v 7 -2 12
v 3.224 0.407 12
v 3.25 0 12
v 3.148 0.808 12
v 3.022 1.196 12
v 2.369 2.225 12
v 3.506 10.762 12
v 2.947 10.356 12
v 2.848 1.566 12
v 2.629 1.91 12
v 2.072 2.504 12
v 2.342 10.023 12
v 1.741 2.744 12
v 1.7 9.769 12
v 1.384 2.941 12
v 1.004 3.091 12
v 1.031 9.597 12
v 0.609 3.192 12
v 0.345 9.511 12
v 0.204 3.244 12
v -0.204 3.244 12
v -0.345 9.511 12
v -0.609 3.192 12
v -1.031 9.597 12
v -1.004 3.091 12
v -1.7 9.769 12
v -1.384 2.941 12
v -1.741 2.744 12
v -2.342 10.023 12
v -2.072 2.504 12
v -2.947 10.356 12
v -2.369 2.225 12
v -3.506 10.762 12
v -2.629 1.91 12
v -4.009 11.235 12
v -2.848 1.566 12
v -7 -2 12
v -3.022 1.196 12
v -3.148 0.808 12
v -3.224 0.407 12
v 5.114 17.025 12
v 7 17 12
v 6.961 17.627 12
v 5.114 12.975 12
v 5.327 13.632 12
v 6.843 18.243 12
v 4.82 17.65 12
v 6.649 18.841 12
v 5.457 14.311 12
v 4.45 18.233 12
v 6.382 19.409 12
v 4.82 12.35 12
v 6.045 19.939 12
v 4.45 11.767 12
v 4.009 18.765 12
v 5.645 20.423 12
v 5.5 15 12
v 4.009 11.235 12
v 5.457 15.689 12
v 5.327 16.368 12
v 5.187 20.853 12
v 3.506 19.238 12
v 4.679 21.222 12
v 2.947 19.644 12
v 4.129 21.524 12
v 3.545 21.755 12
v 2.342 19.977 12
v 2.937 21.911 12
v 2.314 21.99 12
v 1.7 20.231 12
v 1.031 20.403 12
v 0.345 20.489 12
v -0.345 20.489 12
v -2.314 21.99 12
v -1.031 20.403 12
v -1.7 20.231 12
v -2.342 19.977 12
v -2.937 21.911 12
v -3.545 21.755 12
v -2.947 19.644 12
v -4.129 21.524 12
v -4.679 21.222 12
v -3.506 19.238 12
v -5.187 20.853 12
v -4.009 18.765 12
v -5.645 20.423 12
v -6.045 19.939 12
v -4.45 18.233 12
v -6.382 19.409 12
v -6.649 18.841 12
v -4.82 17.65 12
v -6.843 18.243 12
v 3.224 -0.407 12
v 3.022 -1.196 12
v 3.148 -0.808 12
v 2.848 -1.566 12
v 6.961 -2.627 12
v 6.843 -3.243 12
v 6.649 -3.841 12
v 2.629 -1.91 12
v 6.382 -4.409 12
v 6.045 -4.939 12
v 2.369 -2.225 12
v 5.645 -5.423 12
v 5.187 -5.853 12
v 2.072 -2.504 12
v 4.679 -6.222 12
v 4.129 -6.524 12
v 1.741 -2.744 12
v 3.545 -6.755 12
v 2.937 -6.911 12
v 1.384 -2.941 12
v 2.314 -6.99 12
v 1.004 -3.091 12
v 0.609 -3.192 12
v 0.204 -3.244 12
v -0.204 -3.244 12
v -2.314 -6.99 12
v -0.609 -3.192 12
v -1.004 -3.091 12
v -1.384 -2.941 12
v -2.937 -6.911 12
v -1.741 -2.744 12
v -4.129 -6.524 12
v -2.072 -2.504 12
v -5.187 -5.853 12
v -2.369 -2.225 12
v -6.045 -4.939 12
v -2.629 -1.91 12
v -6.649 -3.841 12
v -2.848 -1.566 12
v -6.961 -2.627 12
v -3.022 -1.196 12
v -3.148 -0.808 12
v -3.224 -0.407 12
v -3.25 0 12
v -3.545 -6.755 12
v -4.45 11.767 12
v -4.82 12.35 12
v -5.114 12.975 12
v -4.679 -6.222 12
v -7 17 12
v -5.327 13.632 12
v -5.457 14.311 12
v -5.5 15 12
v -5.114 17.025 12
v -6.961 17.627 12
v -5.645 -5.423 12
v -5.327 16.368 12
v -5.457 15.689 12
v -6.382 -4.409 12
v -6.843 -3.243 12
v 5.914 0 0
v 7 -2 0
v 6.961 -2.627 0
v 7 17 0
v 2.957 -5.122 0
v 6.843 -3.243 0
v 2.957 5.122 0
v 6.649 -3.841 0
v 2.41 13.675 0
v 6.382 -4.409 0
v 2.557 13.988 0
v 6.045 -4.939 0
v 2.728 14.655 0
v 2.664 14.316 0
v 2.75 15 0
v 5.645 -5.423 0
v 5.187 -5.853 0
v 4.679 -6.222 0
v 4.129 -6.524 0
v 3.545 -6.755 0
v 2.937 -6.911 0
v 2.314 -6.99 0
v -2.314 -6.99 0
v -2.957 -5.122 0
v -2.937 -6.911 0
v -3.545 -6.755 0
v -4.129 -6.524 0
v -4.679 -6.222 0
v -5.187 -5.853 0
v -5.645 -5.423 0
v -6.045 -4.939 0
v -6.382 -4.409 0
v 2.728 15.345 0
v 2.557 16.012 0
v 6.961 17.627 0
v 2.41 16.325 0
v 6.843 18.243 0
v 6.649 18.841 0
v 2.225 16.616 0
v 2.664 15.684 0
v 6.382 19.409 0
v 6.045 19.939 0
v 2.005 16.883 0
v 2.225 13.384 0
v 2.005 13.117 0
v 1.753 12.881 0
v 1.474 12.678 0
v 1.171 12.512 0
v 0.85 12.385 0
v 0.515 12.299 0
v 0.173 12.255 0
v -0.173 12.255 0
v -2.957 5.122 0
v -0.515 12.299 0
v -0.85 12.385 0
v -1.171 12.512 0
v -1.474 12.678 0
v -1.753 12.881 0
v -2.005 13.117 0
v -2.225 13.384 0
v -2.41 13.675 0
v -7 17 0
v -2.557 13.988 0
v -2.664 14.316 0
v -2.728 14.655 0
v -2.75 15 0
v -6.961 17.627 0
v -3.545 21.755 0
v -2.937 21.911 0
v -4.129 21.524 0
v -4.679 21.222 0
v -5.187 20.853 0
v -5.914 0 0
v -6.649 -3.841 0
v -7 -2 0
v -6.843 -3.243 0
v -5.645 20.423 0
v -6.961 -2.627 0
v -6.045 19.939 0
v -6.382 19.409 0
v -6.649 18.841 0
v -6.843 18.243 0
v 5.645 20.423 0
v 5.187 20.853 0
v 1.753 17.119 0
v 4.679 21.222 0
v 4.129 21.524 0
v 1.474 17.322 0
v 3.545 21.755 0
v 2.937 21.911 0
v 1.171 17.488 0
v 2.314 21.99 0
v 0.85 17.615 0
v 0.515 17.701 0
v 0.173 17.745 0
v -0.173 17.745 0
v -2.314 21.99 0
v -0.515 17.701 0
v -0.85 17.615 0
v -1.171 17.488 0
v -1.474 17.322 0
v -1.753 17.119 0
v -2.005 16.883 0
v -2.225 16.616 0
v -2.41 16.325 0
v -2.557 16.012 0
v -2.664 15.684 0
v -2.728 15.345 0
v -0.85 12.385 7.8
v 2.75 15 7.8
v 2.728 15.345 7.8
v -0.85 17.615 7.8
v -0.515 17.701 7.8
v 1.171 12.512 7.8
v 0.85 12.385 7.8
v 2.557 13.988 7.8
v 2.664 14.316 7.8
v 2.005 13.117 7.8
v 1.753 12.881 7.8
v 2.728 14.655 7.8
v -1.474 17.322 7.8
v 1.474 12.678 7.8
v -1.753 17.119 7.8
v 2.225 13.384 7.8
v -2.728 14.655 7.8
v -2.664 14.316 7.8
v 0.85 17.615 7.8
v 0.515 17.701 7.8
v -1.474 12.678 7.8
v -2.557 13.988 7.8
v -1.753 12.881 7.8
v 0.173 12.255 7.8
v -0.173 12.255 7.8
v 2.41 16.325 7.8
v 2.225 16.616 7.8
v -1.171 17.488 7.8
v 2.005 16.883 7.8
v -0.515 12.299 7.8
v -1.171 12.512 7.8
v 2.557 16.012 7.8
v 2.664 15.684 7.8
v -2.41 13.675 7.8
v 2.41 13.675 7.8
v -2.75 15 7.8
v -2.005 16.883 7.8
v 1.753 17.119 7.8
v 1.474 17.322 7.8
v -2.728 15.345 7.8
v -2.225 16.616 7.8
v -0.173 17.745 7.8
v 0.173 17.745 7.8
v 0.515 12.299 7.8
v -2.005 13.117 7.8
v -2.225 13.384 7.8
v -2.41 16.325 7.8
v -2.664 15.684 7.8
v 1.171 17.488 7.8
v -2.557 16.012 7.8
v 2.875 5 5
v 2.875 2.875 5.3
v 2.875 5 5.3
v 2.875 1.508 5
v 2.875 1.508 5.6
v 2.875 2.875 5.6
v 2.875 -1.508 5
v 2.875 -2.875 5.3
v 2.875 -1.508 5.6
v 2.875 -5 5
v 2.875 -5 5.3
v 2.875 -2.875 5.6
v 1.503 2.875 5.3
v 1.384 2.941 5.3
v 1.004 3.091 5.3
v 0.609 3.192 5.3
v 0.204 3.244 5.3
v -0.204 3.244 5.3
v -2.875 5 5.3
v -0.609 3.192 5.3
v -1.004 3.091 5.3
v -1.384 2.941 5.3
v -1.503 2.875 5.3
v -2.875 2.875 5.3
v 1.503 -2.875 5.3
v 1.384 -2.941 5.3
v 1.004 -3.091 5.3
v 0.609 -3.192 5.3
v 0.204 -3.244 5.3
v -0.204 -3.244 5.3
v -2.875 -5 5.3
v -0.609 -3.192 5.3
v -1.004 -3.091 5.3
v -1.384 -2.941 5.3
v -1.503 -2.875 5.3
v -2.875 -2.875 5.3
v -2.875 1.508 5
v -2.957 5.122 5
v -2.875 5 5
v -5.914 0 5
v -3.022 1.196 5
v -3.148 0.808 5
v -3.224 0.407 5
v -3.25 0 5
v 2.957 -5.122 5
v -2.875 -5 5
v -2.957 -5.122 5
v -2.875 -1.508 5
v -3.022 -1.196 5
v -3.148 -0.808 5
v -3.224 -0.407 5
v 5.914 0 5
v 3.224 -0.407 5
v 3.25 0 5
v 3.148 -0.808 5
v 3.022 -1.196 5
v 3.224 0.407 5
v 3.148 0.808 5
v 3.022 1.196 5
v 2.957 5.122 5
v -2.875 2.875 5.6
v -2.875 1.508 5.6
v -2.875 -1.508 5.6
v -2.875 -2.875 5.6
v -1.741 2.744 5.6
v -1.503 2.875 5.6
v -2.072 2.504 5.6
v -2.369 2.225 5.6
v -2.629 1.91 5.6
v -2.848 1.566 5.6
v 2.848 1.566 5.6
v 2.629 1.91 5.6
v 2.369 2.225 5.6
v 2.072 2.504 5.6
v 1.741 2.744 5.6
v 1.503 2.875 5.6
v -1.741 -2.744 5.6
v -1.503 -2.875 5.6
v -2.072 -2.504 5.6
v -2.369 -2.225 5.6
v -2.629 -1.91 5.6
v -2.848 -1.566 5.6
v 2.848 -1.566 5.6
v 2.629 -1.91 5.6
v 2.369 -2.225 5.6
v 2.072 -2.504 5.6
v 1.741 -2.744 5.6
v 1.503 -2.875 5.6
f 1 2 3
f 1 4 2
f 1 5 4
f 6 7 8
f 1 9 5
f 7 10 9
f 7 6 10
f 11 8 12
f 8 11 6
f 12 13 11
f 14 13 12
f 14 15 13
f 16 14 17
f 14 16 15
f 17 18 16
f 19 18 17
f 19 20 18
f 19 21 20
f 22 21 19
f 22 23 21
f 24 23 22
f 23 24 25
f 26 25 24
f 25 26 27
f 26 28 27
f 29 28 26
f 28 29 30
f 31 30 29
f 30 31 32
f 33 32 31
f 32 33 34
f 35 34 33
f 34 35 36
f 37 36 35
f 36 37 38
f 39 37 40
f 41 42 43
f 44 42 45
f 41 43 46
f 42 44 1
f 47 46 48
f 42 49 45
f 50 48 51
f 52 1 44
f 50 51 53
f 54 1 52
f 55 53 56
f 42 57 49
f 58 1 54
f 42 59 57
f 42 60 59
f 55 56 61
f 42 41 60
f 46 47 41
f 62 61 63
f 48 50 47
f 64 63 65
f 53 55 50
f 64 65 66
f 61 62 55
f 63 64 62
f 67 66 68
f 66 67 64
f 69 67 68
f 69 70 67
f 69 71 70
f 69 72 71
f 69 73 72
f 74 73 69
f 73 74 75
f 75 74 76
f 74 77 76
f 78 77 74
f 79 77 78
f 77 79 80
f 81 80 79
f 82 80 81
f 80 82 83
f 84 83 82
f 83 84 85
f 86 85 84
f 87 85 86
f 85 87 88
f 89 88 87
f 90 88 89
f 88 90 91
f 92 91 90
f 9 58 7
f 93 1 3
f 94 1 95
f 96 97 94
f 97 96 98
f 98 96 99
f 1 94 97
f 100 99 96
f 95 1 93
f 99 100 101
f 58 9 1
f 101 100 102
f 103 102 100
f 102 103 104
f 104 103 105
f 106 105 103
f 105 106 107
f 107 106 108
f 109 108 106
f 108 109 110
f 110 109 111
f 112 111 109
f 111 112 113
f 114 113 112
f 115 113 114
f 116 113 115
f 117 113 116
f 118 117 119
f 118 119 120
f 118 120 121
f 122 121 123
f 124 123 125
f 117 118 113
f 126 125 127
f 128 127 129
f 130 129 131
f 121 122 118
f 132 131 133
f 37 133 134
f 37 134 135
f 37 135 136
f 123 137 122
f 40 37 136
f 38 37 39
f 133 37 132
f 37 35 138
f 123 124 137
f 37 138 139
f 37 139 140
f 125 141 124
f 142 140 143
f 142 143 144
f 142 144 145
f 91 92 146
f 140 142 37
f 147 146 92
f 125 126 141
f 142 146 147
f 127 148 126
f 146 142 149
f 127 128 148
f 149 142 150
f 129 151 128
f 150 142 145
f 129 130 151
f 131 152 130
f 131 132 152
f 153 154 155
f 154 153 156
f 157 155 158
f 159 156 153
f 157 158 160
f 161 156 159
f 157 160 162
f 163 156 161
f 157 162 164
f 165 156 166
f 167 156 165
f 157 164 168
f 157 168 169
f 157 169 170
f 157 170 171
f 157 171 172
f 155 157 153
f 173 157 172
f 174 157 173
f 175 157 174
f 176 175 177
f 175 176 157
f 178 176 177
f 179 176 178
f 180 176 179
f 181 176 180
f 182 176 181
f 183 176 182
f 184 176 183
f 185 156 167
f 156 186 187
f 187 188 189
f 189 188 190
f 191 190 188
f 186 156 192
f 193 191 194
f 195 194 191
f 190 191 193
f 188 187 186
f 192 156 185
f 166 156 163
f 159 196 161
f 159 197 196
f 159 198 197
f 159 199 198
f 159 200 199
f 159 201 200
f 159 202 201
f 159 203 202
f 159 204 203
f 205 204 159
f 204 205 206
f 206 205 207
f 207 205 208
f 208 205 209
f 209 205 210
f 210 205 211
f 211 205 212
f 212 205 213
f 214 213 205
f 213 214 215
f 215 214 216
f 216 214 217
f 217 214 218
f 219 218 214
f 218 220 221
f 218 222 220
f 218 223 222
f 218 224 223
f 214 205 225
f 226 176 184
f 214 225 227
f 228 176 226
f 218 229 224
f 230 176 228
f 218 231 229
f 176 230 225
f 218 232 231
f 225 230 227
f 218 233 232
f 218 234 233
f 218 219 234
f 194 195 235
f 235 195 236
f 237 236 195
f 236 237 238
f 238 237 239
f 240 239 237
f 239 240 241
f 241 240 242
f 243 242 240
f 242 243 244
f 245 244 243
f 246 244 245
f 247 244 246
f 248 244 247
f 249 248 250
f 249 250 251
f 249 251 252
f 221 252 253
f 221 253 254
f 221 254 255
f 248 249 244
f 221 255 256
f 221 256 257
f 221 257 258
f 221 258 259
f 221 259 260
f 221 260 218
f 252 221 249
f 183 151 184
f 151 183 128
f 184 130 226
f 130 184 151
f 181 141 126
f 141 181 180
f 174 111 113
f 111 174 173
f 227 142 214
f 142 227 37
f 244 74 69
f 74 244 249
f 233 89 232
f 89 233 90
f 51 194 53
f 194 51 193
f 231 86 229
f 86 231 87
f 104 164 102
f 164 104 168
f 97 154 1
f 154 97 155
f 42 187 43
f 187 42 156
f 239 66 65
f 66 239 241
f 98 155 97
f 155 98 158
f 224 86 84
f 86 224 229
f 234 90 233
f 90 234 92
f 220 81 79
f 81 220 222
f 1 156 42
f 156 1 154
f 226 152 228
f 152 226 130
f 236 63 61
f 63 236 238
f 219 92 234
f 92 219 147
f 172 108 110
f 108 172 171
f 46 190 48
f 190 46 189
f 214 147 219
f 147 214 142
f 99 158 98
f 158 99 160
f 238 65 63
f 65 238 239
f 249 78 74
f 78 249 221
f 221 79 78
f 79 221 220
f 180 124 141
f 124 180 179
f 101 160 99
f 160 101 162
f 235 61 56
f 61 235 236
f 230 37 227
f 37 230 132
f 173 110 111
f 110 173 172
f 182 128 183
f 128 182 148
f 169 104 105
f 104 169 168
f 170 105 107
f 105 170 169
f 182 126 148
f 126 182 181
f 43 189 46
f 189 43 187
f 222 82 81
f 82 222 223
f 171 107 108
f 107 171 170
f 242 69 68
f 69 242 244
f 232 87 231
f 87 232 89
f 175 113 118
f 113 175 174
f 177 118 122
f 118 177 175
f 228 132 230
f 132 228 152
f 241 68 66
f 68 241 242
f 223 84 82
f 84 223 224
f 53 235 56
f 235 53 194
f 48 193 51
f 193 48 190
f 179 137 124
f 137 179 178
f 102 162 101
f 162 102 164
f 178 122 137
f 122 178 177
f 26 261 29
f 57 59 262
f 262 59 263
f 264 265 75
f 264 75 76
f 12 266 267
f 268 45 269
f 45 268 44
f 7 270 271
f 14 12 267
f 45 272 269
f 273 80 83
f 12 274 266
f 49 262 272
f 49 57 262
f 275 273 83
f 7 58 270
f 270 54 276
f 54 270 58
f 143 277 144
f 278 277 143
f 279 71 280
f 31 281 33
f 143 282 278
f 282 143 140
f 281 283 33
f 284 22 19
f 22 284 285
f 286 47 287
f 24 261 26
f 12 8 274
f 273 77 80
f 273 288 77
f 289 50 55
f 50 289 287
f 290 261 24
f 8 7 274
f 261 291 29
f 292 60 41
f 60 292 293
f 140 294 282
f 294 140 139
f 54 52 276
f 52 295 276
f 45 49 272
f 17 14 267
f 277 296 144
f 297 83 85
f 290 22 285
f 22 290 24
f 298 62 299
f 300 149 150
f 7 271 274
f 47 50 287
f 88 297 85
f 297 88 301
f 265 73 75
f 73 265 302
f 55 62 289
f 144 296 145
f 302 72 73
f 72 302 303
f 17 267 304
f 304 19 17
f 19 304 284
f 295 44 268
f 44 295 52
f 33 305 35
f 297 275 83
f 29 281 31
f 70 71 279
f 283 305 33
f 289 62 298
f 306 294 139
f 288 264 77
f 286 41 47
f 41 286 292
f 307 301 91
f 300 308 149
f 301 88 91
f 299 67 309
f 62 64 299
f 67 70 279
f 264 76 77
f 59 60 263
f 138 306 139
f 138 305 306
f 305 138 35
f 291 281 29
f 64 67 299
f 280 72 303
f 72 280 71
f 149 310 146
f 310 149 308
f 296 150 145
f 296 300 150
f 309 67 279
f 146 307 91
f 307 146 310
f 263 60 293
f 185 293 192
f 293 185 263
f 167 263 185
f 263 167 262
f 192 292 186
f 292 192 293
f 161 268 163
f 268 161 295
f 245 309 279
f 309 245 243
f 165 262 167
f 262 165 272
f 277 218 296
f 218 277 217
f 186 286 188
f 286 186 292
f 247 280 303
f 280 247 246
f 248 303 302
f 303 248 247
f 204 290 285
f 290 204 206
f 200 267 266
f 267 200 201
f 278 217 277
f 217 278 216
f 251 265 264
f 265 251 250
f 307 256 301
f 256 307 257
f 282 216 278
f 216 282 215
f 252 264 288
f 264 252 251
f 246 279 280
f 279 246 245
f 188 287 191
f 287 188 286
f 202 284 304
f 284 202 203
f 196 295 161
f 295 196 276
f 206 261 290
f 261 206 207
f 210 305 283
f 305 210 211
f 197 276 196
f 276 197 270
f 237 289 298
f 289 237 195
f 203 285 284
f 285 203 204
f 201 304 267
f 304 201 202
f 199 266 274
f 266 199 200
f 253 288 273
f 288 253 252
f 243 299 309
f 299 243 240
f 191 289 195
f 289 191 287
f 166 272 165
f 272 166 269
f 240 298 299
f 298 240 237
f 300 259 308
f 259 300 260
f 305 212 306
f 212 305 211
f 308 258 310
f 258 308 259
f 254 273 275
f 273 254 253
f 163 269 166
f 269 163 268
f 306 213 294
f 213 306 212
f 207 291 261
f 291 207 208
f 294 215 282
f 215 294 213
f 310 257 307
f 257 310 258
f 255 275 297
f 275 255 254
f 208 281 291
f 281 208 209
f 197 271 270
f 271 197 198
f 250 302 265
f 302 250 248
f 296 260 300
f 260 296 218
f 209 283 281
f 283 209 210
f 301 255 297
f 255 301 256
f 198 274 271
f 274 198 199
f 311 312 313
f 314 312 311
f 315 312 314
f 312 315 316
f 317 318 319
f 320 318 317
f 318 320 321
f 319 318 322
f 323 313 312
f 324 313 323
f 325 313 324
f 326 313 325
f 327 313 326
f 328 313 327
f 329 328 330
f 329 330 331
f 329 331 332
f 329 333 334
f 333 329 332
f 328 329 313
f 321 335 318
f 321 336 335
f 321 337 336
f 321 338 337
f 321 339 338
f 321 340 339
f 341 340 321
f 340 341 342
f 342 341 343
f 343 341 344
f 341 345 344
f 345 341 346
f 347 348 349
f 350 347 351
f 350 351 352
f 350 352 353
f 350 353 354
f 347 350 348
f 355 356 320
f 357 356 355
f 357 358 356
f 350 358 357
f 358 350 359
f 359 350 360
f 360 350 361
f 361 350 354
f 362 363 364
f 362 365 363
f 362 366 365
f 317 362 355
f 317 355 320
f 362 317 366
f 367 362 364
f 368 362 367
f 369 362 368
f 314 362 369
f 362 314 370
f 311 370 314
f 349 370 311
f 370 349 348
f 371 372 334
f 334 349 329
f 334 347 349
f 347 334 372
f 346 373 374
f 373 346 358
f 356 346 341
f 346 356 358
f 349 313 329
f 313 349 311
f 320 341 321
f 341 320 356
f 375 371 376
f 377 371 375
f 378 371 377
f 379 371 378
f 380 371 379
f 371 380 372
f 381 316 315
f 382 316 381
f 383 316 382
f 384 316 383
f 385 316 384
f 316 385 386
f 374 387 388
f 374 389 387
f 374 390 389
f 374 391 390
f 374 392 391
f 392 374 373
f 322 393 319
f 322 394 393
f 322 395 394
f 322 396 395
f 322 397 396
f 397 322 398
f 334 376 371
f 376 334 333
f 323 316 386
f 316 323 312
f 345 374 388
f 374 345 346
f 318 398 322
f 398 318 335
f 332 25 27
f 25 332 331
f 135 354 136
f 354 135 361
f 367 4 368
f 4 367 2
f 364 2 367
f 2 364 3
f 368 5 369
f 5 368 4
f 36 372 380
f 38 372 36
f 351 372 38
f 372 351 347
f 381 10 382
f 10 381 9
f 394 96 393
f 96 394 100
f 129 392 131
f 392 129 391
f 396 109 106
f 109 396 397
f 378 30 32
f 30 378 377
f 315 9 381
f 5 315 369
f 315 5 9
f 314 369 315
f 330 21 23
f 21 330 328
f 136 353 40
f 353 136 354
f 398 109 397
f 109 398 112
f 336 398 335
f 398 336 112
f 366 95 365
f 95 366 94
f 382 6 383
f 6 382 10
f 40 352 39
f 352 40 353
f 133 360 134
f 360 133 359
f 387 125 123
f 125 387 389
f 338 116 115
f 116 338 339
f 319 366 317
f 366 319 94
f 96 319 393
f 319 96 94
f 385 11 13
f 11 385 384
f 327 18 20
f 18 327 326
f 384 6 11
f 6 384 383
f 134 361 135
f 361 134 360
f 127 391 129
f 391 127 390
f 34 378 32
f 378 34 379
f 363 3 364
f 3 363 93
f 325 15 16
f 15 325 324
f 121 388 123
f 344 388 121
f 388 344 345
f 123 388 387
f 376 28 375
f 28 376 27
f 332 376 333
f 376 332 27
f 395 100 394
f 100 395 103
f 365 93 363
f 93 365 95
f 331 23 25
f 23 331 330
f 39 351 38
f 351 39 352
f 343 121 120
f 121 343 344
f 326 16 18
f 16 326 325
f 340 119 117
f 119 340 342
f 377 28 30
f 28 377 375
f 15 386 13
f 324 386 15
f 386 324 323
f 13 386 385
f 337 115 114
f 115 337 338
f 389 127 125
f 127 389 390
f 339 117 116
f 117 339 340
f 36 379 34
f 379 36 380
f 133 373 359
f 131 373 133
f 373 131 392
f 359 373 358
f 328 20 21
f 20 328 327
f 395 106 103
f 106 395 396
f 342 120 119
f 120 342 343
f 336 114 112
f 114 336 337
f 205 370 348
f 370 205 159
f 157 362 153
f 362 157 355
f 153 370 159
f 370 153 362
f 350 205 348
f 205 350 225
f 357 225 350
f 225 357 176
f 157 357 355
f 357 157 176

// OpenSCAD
$fn = 50;


difference() {
	union() {
		cylinder(h = 12, r = 7.0000000000);
		translate(v = [0.0000000000, 7.5000000000, 0]) {
			hull() {
				translate(v = [-2.0000000000, 9.5000000000, 0]) {
					cylinder(h = 12, r = 5);
				}
				translate(v = [2.0000000000, 9.5000000000, 0]) {
					cylinder(h = 12, r = 5);
				}
				translate(v = [-2.0000000000, -9.5000000000, 0]) {
					cylinder(h = 12, r = 5);
				}
				translate(v = [2.0000000000, -9.5000000000, 0]) {
					cylinder(h = 12, r = 5);
				}
			}
		}
		translate(v = [0.0000000000, 7.5000000000, 0]) {
			hull() {
				translate(v = [-2.0000000000, 9.5000000000, 0]) {
					cylinder(h = 12, r = 5);
				}
				translate(v = [2.0000000000, 9.5000000000, 0]) {
					cylinder(h = 12, r = 5);
				}
				translate(v = [-2.0000000000, -9.5000000000, 0]) {
					cylinder(h = 12, r = 5);
				}
				translate(v = [2.0000000000, -9.5000000000, 0]) {
					cylinder(h = 12, r = 5);
				}
			}
		}
	}
	union() {
		translate(v = [0.0000000000, 15.0000000000, 12]) {
			rotate(a = [0, 0, 0]) {
				difference() {
					union() {
						#translate(v = [0, 0, -12.0000000000]) {
							cylinder(h = 12, r = 2.2500000000);
						}
						#translate(v = [0, 0, -4.2000000000]) {
							cylinder(h = 4.2000000000, r1 = 2.7500000000, r2 = 5.5000000000);
						}
						#translate(v = [0, 0, -12.0000000000]) {
							cylinder(h = 12, r = 2.7500000000);
						}
						#translate(v = [0, 0, -12.0000000000]) {
							cylinder(h = 12, r = 2.2500000000);
						}
					}
					union();
				}
			}
		}
		translate(v = [0.0000000000, 15.0000000000, 12]) {
			rotate(a = [0, 0, 0]) {
				difference() {
					union() {
						#translate(v = [0, 0, -12.0000000000]) {
							cylinder(h = 12, r = 2.2500000000);
						}
						#translate(v = [0, 0, -4.2000000000]) {
							cylinder(h = 4.2000000000, r1 = 2.7500000000, r2 = 5.5000000000);
						}
						#translate(v = [0, 0, -12.0000000000]) {
							cylinder(h = 12, r = 2.7500000000);
						}
						#translate(v = [0, 0, -12.0000000000]) {
							cylinder(h = 12, r = 2.2500000000);
						}
					}
					union();
				}
			}
		}
		translate(v = [0.0000000000, 0.0000000000, 0]) {
			rotate(a = [0, 0, 0]) {
				difference() {
					union() {
						#translate(v = [-2.8750000000, -5.0000000000, -0.3000000000]) {
							cube(size = [5.7500000000, 10, 0.3000000000]);
						}
						#translate(v = [-2.8750000000, -2.8750000000, -0.6000000000]) {
							cube(size = [5.7500000000, 5.7500000000, 0.3000000000]);
						}
						#translate(v = [-2.8750000000, -5.0000000000, 5]) {
							cube(size = [5.7500000000, 10, 0.3000000000]);
						}
						#translate(v = [-2.8750000000, -2.8750000000, 5.3000000000]) {
							cube(size = [5.7500000000, 5.7500000000, 0.3000000000]);
						}
						#translate(v = [0, 0, -100.0000000000]) {
							cylinder(h = 200, r = 3.2500000000);
						}
						#linear_extrude(height = 5) {
							polygon(points = [[5.9142500000, 0.0000000000], [2.9571250000, 5.1218907443], [-2.9571250000, 5.1218907443], [-5.9142500000, 0.0000000000], [-2.9571250000, -5.1218907443], [2.9571250000, -5.1218907443]]);
						}
						#translate(v = [-2.8750000000, -5.0000000000, -0.3000000000]) {
							cube(size = [5.7500000000, 10, 0.3000000000]);
						}
						#translate(v = [-2.8750000000, -2.8750000000, -0.6000000000]) {
							cube(size = [5.7500000000, 5.7500000000, 0.3000000000]);
						}
						#translate(v = [-2.8750000000, -5.0000000000, 5]) {
							cube(size = [5.7500000000, 10, 0.3000000000]);
						}
						#translate(v = [-2.8750000000, -2.8750000000, 5.3000000000]) {
							cube(size = [5.7500000000, 5.7500000000, 0.3000000000]);
						}
						#translate(v = [0, 0, -100.0000000000]) {
							cylinder(h = 200, r = 3.2500000000);
						}
						#translate(v = [-2.8750000000, -5.0000000000, -0.3000000000]) {
							cube(size = [5.7500000000, 10, 0.3000000000]);
						}
						#translate(v = [-2.8750000000, -2.8750000000, -0.6000000000]) {
							cube(size = [5.7500000000, 5.7500000000, 0.3000000000]);
						}
						#translate(v = [-2.8750000000, -5.0000000000, 5]) {
							cube(size = [5.7500000000, 10, 0.3000000000]);
						}
						#translate(v = [-2.8750000000, -2.8750000000, 5.3000000000]) {
							cube(size = [5.7500000000, 5.7500000000, 0.3000000000]);
						}
						#translate(v = [0, 0, -100.0000000000]) {
							cylinder(h = 200, r = 3.2500000000);
						}
					}
					union();
				}
			}
		}
		translate(v = [0, 0, -100]) {
			cylinder(h = 200, r = 3.2500000000);
		}
		translate(v = [0, 0, -100]) {
			cylinder(h = 200, r = 1.8000000000);
		}
	}
}
